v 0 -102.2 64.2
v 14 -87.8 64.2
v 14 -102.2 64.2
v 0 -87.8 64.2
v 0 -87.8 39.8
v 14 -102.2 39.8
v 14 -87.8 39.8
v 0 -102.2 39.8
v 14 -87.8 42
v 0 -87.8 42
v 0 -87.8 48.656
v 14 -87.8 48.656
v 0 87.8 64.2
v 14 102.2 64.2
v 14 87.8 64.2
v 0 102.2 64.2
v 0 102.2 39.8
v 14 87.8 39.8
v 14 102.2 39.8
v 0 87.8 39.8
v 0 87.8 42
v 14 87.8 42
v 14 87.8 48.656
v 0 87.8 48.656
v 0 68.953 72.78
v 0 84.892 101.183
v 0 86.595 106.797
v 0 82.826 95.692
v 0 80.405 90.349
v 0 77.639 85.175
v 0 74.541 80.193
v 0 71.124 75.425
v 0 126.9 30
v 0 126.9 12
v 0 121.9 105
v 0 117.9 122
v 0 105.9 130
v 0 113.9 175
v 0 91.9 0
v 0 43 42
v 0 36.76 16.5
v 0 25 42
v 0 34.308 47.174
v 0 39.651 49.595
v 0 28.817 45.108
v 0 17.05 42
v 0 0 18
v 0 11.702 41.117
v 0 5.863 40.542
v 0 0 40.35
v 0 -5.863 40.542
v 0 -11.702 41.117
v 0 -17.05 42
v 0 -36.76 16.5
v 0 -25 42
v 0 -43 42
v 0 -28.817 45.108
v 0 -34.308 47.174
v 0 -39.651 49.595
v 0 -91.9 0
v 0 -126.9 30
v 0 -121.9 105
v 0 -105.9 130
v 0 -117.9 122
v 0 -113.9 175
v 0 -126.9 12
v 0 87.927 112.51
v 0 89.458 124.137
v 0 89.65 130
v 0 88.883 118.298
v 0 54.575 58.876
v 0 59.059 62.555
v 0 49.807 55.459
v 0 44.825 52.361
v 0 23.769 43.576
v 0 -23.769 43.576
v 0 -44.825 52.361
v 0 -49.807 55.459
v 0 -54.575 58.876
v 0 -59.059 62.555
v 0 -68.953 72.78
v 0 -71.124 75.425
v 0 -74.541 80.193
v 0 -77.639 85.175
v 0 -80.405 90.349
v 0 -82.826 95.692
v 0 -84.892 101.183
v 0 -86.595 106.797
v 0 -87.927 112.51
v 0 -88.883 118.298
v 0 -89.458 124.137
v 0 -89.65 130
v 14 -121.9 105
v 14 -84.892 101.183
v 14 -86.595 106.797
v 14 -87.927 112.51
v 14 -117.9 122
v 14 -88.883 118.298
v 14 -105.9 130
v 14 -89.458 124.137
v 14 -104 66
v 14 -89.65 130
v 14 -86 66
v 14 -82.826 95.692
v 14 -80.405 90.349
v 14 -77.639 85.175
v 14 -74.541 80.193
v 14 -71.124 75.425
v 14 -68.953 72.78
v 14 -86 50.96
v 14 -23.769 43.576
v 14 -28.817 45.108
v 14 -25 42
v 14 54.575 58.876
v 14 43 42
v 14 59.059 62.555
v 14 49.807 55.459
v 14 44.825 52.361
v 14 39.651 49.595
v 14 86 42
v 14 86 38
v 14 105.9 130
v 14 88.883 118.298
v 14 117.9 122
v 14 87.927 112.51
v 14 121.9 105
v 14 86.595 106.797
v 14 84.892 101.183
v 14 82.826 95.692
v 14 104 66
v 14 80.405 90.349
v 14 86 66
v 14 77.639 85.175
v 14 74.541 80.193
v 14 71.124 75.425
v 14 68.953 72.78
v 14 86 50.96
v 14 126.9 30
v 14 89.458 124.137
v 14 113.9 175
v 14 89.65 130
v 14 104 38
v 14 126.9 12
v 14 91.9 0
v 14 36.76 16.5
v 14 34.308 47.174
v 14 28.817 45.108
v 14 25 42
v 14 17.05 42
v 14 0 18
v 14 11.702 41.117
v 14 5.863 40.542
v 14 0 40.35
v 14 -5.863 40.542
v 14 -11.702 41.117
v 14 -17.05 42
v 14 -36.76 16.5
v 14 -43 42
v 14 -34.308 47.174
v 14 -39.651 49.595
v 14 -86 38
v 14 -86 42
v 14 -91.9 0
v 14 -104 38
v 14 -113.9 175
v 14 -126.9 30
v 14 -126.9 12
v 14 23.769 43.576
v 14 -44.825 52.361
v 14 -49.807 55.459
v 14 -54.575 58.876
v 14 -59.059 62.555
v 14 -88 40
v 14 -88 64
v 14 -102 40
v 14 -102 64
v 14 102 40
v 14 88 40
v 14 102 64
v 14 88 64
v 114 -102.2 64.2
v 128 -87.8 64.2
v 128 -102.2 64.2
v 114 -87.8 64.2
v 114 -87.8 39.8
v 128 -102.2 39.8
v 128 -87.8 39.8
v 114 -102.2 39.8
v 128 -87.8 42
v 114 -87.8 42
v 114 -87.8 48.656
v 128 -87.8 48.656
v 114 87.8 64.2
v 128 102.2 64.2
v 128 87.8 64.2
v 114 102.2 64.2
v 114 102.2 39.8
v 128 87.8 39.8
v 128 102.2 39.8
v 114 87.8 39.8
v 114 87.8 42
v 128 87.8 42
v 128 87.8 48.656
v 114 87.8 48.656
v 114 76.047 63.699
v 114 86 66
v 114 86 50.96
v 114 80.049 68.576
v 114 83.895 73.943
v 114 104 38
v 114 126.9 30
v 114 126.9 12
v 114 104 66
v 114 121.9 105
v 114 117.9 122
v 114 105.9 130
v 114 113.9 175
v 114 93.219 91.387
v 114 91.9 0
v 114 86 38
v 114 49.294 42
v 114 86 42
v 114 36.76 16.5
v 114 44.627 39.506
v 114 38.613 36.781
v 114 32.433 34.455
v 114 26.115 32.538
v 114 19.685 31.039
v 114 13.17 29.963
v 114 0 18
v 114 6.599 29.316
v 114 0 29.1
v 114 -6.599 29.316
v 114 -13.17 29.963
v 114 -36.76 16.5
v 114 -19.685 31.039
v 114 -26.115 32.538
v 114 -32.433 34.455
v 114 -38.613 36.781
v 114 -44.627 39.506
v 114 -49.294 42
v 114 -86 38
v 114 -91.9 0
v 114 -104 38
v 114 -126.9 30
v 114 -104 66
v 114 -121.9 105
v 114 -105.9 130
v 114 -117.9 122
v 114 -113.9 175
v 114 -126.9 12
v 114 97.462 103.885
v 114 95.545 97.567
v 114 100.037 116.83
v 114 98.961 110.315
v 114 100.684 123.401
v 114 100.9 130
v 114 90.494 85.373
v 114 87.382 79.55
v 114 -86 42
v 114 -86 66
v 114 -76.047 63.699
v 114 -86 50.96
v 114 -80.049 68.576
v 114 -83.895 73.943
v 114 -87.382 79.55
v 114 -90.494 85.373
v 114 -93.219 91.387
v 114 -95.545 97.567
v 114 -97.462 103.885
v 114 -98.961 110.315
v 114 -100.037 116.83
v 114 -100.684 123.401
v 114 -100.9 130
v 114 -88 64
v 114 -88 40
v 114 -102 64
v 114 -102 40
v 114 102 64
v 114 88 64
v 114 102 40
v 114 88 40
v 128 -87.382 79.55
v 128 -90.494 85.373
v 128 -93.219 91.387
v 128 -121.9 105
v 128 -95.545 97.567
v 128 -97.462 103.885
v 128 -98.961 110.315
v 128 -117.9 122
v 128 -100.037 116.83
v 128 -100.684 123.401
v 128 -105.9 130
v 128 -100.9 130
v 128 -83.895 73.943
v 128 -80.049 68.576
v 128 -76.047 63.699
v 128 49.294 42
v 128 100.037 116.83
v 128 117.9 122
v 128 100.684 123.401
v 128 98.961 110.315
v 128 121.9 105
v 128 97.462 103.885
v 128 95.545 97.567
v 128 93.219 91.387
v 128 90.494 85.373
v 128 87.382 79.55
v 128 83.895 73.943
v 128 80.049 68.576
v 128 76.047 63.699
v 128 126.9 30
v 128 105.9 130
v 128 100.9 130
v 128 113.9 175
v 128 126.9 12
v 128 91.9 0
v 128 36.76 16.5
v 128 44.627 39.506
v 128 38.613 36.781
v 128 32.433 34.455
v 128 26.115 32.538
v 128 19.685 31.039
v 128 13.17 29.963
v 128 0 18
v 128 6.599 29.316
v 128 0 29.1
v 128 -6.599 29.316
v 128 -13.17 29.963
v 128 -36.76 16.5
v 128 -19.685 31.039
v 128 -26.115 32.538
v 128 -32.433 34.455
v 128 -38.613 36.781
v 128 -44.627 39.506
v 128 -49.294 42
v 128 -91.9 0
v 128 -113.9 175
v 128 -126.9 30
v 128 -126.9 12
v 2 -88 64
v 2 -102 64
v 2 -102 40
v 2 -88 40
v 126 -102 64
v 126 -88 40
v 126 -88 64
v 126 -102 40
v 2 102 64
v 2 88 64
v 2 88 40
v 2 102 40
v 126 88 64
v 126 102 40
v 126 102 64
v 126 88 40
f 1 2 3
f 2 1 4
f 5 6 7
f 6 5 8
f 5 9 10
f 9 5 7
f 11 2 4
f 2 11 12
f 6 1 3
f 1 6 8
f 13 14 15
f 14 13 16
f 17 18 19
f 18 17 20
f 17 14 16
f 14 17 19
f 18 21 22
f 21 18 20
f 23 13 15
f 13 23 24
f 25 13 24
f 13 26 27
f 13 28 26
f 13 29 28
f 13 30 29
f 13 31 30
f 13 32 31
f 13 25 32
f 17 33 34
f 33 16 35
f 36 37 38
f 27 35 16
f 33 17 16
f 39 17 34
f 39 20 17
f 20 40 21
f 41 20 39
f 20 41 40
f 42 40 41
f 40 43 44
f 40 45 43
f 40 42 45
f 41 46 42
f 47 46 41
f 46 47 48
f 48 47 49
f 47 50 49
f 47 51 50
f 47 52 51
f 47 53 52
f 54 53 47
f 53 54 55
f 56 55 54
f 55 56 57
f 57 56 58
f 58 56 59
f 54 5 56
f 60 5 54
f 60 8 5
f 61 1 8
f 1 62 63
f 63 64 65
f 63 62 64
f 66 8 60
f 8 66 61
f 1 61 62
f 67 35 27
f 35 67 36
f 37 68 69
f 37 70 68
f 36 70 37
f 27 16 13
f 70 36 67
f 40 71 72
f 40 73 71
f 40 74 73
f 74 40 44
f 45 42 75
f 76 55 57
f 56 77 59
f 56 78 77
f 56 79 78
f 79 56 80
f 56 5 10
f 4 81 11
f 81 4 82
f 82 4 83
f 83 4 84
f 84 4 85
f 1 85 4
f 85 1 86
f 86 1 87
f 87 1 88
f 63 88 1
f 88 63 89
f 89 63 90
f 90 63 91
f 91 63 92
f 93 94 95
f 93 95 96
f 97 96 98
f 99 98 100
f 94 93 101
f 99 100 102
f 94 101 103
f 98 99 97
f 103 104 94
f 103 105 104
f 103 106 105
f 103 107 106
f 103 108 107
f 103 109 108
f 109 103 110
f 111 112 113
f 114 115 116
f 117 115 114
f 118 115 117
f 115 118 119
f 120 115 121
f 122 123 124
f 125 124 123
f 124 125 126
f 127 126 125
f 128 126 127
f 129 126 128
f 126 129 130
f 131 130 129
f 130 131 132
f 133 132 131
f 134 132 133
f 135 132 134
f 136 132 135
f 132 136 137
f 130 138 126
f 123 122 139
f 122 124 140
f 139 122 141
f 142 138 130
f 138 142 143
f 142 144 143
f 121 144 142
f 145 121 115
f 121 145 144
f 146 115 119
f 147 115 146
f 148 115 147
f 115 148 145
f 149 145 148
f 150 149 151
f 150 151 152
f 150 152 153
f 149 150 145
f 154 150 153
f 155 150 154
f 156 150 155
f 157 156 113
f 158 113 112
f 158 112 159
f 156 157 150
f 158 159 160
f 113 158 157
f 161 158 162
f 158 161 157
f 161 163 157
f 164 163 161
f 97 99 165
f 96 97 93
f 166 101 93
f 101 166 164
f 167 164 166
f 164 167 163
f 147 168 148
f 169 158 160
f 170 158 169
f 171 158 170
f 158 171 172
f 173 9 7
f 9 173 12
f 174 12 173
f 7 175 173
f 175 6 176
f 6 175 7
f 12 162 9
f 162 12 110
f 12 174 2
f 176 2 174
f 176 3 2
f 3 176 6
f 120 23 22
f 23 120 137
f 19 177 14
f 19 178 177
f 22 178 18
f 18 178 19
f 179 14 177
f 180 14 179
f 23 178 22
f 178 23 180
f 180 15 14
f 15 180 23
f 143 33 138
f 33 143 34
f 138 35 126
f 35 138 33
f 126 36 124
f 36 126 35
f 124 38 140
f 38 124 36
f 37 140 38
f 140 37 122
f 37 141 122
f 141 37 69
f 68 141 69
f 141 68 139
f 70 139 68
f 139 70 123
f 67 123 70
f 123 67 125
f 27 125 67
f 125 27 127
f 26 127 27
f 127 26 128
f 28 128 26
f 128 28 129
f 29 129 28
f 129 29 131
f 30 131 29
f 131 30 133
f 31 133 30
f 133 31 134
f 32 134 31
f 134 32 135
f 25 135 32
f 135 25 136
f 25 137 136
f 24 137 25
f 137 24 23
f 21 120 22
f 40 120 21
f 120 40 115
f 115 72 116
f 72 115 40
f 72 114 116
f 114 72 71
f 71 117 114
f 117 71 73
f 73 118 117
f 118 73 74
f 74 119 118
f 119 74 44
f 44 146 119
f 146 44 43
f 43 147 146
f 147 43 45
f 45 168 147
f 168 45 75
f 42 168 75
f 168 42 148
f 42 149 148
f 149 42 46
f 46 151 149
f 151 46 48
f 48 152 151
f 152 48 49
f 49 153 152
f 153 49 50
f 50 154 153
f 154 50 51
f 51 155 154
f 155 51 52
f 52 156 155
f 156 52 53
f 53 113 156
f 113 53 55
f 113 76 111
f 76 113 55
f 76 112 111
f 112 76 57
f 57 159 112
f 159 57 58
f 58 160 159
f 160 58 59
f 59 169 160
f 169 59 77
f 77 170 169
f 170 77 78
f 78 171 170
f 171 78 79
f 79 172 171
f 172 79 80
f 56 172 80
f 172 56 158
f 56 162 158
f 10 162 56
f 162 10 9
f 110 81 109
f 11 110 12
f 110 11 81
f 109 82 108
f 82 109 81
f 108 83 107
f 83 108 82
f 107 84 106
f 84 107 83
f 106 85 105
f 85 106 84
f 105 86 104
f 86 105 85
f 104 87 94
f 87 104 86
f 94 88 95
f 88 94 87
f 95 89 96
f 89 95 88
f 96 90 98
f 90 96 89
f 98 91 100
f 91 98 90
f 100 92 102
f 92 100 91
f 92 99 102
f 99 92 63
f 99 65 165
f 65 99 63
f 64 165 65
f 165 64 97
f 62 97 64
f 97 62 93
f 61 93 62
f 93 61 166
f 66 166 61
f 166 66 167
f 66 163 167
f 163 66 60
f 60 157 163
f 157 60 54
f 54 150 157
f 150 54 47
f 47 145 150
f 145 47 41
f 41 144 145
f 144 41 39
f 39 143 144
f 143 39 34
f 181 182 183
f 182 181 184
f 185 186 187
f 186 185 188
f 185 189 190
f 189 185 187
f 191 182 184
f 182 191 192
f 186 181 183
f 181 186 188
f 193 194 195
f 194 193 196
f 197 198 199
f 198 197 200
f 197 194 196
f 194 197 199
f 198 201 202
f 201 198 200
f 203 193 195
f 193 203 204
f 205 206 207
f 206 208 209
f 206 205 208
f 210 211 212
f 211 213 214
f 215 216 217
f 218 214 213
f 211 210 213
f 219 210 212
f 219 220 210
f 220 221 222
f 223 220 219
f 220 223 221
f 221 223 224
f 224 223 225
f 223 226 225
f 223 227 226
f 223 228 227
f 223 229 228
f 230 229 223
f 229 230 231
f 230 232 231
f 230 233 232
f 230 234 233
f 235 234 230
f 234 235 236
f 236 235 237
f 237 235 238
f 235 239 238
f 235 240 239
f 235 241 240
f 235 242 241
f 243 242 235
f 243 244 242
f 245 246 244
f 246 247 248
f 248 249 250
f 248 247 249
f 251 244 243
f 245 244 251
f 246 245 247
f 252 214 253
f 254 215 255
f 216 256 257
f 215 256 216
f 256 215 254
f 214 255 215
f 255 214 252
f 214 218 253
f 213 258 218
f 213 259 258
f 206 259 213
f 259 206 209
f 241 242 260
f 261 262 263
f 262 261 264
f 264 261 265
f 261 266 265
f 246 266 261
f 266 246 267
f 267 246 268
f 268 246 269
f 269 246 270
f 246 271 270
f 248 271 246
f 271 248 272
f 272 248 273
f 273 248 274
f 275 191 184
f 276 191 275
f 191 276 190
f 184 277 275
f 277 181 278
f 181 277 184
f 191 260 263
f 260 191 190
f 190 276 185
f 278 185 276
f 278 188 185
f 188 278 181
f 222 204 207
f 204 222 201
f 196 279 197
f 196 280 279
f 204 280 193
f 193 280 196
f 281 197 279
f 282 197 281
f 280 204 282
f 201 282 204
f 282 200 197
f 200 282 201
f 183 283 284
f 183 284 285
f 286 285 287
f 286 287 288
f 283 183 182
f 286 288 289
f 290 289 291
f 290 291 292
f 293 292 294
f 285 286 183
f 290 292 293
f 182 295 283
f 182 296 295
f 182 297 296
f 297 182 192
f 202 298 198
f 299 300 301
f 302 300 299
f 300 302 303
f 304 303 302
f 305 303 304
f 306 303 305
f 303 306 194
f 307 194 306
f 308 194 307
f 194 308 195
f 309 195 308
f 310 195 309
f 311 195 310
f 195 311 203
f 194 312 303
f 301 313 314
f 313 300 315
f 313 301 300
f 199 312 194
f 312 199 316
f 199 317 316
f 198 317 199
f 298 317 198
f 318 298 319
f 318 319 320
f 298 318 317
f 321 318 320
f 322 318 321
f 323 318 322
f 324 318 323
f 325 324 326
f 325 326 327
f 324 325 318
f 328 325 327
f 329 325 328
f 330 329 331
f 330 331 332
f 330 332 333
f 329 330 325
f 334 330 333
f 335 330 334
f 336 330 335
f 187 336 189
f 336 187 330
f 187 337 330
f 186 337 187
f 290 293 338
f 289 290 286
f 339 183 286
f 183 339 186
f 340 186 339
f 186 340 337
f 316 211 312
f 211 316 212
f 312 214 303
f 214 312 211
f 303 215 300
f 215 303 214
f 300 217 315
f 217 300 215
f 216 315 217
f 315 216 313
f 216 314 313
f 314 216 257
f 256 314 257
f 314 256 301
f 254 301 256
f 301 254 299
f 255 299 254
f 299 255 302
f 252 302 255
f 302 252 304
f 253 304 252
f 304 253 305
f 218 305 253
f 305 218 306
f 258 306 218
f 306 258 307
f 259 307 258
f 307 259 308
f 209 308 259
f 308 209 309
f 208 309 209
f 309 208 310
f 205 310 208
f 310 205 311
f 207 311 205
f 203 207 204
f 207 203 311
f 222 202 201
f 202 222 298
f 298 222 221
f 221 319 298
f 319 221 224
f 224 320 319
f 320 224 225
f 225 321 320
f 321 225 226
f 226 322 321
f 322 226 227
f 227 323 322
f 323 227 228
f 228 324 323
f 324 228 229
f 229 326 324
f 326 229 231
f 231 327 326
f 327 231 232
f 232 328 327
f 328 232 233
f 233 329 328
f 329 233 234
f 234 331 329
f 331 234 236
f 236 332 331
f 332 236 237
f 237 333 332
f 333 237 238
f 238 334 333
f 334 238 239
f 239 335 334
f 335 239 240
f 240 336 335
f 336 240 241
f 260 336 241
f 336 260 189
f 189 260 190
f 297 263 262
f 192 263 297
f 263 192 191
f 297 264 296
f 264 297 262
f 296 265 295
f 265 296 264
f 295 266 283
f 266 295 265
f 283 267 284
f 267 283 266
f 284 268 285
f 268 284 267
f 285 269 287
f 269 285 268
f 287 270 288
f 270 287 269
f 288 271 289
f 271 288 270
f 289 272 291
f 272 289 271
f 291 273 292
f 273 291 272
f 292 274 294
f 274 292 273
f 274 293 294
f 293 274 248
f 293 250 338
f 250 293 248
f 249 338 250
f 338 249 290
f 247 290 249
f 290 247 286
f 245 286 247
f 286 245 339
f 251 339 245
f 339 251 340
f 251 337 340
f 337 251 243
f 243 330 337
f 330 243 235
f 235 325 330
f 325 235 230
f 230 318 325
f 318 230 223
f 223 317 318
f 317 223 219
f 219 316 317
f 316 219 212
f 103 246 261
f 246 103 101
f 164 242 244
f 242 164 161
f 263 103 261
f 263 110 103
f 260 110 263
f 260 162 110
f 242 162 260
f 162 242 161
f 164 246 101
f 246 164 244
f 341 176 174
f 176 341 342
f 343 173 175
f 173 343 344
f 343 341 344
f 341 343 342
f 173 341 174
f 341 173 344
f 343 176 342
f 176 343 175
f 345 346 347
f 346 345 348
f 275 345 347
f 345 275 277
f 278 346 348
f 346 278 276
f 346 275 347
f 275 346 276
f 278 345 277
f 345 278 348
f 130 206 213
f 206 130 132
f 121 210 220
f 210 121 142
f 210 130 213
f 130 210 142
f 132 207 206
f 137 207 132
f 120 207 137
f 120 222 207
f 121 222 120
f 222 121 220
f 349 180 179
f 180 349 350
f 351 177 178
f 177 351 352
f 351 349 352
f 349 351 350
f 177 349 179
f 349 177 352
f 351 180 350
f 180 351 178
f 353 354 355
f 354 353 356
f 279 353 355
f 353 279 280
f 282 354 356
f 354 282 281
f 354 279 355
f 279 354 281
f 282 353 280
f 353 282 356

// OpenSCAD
// ============================================================
//  ALPHORN BELL STAND — Alpine Peaks edition
//
//  Cradles section 19 of the 3D-printed F alphorn during play.
//
//  DESIGN: two stylized mountain-silhouette END PIECES connected
//  by two press-fit RAILS. Each end piece has a half-cup saddle
//  carved out of its top, sized to match the bell at that axial
//  position. Peaks on each side of the saddle act as lip stops.
//  Faceted angled feet raise the entire stand off the ground.
//
//  HOW IT PREVENTS SLIDING:
//  The two end pieces are sized for different parts of the
//  bell cone — back saddle R=89.65mm, front saddle R=100.9mm.
//  This matches the bell's natural taper, creating a self-
//  wedging fit:
//    - Forward sliding: bell mouth (R=110) is wider than the
//      front saddle opening (R=100.9). Cannot pass through.
//    - Backward sliding: gravity pulls the cone deeper into
//      the matched-taper saddle.
//    - Lifting/rolling: peaks on either side of each saddle
//      rise 45mm above the bell axis, blocking liftoff.
//
//  ASSEMBLY (no glue):
//  Each rail has a tenon at each end that press-fits into a
//  matching mortise in each end piece. Slight interference fit
//  (0.20mm clearance per side) makes the joints snug. Push
//  rails into end pieces by hand; if too tight, sand the tenon
//  faces; if too loose, wrap a turn of PTFE tape.
//
//  PIECES (4 total, all flat-printable):
//    - 2 end pieces (different — front has larger saddle)
//    - 2 rails (identical)
//
//  RENDER FLAGS BELOW: set RENDER to view individual pieces.
// ============================================================

// ------------------------------------------------------------
//  RENDER SELECTOR
// ------------------------------------------------------------
RENDER = "assembly";   // "assembly" | "front_end" | "back_end" | "rail"

// ------------------------------------------------------------
//  ALPHORN BELL DIMENSIONS (from alphorn.scad bore profile)
// ------------------------------------------------------------
//  Section 19 spans z=3675.8 to z=3880mm.
//  We cradle from z=3700 (back end) to z=3800 (front end).
//
//    z=3700: bell OD = 177.3mm   (small end of cradle)
//    z=3800: bell OD = 199.8mm   (large end of cradle)
//    Cone half-angle: 6.4°

CRADLE_LENGTH       = 100;    // mm  axial spacing between end pieces
CRADLE_OD_BACK      = 177.3;  // mm  bell OD at back of cradle
CRADLE_OD_FRONT     = 199.8;  // mm  bell OD at front of cradle
CRADLE_CLEARANCE    = 1.0;    // mm  radial slop for easy seating

NOTCH_R_BACK        = CRADLE_OD_BACK  / 2 + CRADLE_CLEARANCE;  // 89.65
NOTCH_R_FRONT       = CRADLE_OD_FRONT / 2 + CRADLE_CLEARANCE;  // 100.9

// ------------------------------------------------------------
//  HEIGHTS
// ------------------------------------------------------------
//  Bell axis sits 130mm above the floor (with feet, ~100mm
//  above feet bottom). The saddle top is at the bell axis so
//  the bell fits exactly into the half-cup carved by the
//  notch circle. Peaks rise 45mm above bell axis on each side
//  of the saddle to lock the bell from rolling out.

FOOT_HEIGHT         = 30;    // mm  height of feet (clearance from floor)
BELL_AXIS_Z         = 130;   // mm  bell axis height
SADDLE_TOP_Z        = BELL_AXIS_Z;
PEAK_Z              = BELL_AXIS_Z + 45;

// ------------------------------------------------------------
//  END PIECE WIDTHS
//  Defined as half-widths from the symmetric centerline.
// ------------------------------------------------------------
//  All half-widths must accommodate the larger (front) bell.
//  At Y = NOTCH_R_FRONT the bell touches the saddle wall, so
//  the polygon must extend at least to that Y.
PEAK_INNER_HALF     = NOTCH_R_FRONT + 5;       // 105.9 — inner edge of peak
PEAK_OUTER_HALF     = PEAK_INNER_HALF + 12;    // 117.9 — outer base of peak
SHOULDER_HALF       = PEAK_OUTER_HALF + 4;     // 121.9 — body shoulder
BASE_HALF           = SHOULDER_HALF + 5;       // 126.9 — base flare
                                                // Total width 253.8mm — within X1C 256

// Foot widths
FOOT_OUTER_HALF     = BASE_HALF;
FOOT_INNER_HALF     = BASE_HALF - 35;          // foot is 35mm wide

// ------------------------------------------------------------
//  PIECE THICKNESS (along horn axis)
// ------------------------------------------------------------
PIECE_THICK         = 14;    // mm

// ------------------------------------------------------------
//  RAIL DIMENSIONS
// ------------------------------------------------------------
//  Rails connect the two end pieces, running parallel to the
//  horn axis. They sit low on the end pieces, well below the
//  bell. Rails are external — they pass on the OUTSIDE of the
//  end pieces, with tenons going through them.

RAIL_LENGTH         = CRADLE_LENGTH;       // 100mm between end pieces
RAIL_TENON_LENGTH   = 12;                  // mm tenon depth into end piece
RAIL_WIDTH          = 18;                  // mm Y extent (cross-axis)
RAIL_HEIGHT         = 28;                  // mm Z extent

// Vertical position of the rails (centerline) - low on the end pieces
RAIL_Z_CENTER       = FOOT_HEIGHT + RAIL_HEIGHT/2 + 8;

// Lateral position - rails sit at Y = ±RAIL_Y, just outboard of where the
// bell hangs. Bell's lowest point at the back is at Y=0, Z=BELL_AXIS_Z-89.65=40.4
// so rails at Y=±95 with center Z=72 are well clear.
RAIL_Y_OFFSET       = 95;

// Tenon dimensions and clearance for press-fit
TENON_WIDTH         = 14;    // mm  Y extent of tenon
TENON_HEIGHT        = 24;    // mm  Z extent of tenon
TENON_CLEARANCE     = 0.20;  // mm  per-side gap (press-fit)

// ------------------------------------------------------------
//  AESTHETIC: alpine ridge cutouts
// ------------------------------------------------------------
//  Triangular windows in the body of each end piece, evoking
//  the layered ridges of an alpine mountain range.

RIDGE_COUNT         = 3;
RIDGE_WIDTH         = 50;
RIDGE_HEIGHT        = 32;

$fn = 96;

// ============================================================
//  END PIECE
//  notch_r:  saddle radius (different for front vs back)
// ============================================================

module end_piece(notch_r) {
    // Mountain silhouette polygon, traced clockwise from
    // the bottom-left foot tip.
    silhouette = [
        // Left foot — angled inner+outer edges
        [-FOOT_INNER_HALF,    0],                           // foot inner-bottom
        [-FOOT_OUTER_HALF,    FOOT_HEIGHT * 0.4],           // foot outer-lower
        [-FOOT_OUTER_HALF,    FOOT_HEIGHT],                 // foot outer-top
        // Body slopes UP and SLIGHTLY IN to shoulder
        [-SHOULDER_HALF,      SADDLE_TOP_Z - 25],           // shoulder
        // Outer base of left peak (slight outward bulge)
        [-PEAK_OUTER_HALF,    SADDLE_TOP_Z - 8],
        // Tip of left peak (asymmetric, leans outward)
        [-PEAK_OUTER_HALF + 4, PEAK_Z],
        // Inner base of left peak — drops down to saddle level
        [-PEAK_INNER_HALF,    SADDLE_TOP_Z],
        // Saddle region — flat across, will be notched out
        [-notch_r,            SADDLE_TOP_Z],
        [ notch_r,            SADDLE_TOP_Z],
        // Right peak (mirror)
        [ PEAK_INNER_HALF,    SADDLE_TOP_Z],
        [ PEAK_OUTER_HALF - 4, PEAK_Z],
        [ PEAK_OUTER_HALF,    SADDLE_TOP_Z - 8],
        // Body and right foot (mirror)
        [ SHOULDER_HALF,      SADDLE_TOP_Z - 25],
        [ FOOT_OUTER_HALF,    FOOT_HEIGHT],
        [ FOOT_OUTER_HALF,    FOOT_HEIGHT * 0.4],
        [ FOOT_INNER_HALF,    0],
        // Bottom edge — arch up between the two feet
        [ FOOT_INNER_HALF * 0.4,  FOOT_HEIGHT * 0.55],
        [ 0,                      FOOT_HEIGHT * 0.6],
        [-FOOT_INNER_HALF * 0.4,  FOOT_HEIGHT * 0.55]
    ];

    // Extrude the silhouette along the horn axis (X), then carve
    // out the saddle (a half-cylinder cut from above) and the
    // ridge windows (triangular through-holes).
    // Then drill the rail mortises.
    difference() {
        // Extrude along X. The silhouette is in the YZ plane;
        // rotate then linear-extrude to make a slab parallel to YZ
        // and thick along X.
        rotate([90, 0, 90])
        linear_extrude(height=PIECE_THICK, center=false)
        difference() {
            polygon(points=silhouette);

            // Saddle notch — circle centered at (0, BELL_AXIS_Z) carves
            // a half-cup from the polygon top. With saddle top at
            // SADDLE_TOP_Z = BELL_AXIS_Z, the circle is exactly tangent
            // to the polygon top; the LOWER half of the circle carves
            // into the polygon, leaving a half-circular cup.
            translate([0, BELL_AXIS_Z])
            circle(r=notch_r);

            // Ridge cutouts — triangles in the lower body
            for (i = [0 : RIDGE_COUNT - 1]) {
                x_offset = (i - (RIDGE_COUNT-1)/2) * (RIDGE_WIDTH + 18);
                translate([x_offset, FOOT_HEIGHT + 12])
                polygon(points=[
                    [-RIDGE_WIDTH/2, 0],
                    [ RIDGE_WIDTH/2, 0],
                    [ 0,             RIDGE_HEIGHT]
                ]);
            }
        }

        // Rail mortises — rectangular through-holes for the tenons.
        // Mortises pierce the entire piece thickness (X direction).
        for (y = [-RAIL_Y_OFFSET, RAIL_Y_OFFSET]) {
            translate([-1, y, RAIL_Z_CENTER])
            translate([0,
                       -(TENON_WIDTH/2 + TENON_CLEARANCE),
                       -(TENON_HEIGHT/2 + TENON_CLEARANCE)])
            cube([PIECE_THICK + 2,
                  TENON_WIDTH + 2*TENON_CLEARANCE,
                  TENON_HEIGHT + 2*TENON_CLEARANCE]);
        }
    }
}

// ============================================================
//  RAIL
//  A bar with a tenon at each end. Tenons pass THROUGH the end
//  pieces; the visible (between-end-pieces) portion of the rail
//  is RAIL_LENGTH long.
// ============================================================

module rail() {
    overall_length = RAIL_LENGTH + 2*RAIL_TENON_LENGTH;
    union() {
        // Main bar (visible between end pieces)
        translate([RAIL_TENON_LENGTH,
                   -RAIL_WIDTH/2,
                   -RAIL_HEIGHT/2])
        cube([RAIL_LENGTH, RAIL_WIDTH, RAIL_HEIGHT]);

        // Back tenon (x = 0 to RAIL_TENON_LENGTH)
        translate([0,
                   -TENON_WIDTH/2,
                   -TENON_HEIGHT/2])
        cube([RAIL_TENON_LENGTH, TENON_WIDTH, TENON_HEIGHT]);

        // Front tenon (x = RAIL_TENON_LENGTH+RAIL_LENGTH to overall_length)
        translate([RAIL_TENON_LENGTH + RAIL_LENGTH,
                   -TENON_WIDTH/2,
                   -TENON_HEIGHT/2])
        cube([RAIL_TENON_LENGTH, TENON_WIDTH, TENON_HEIGHT]);
    }
}

// ============================================================
//  ASSEMBLY VIEW
// ============================================================

module assembly() {
    // Back end piece at x=0 (smaller saddle)
    color("LightSteelBlue")
    end_piece(notch_r=NOTCH_R_BACK);

    // Front end piece at x=CRADLE_LENGTH+PIECE_THICK (larger saddle)
    color("LightSteelBlue")
    translate([CRADLE_LENGTH + PIECE_THICK, 0, 0])
    end_piece(notch_r=NOTCH_R_FRONT);

    // Two rails connecting them
    color("Tan")
    for (y = [-RAIL_Y_OFFSET, RAIL_Y_OFFSET]) {
        translate([-RAIL_TENON_LENGTH + PIECE_THICK,
                   y,
                   RAIL_Z_CENTER])
        rail();
    }
}

// ============================================================
//  RENDER DISPATCH
// ============================================================

if (RENDER == "assembly") {
    assembly();
} else if (RENDER == "front_end") {
    end_piece(notch_r=NOTCH_R_FRONT);
} else if (RENDER == "back_end") {
    end_piece(notch_r=NOTCH_R_BACK);
} else if (RENDER == "rail") {
    rail();
}
